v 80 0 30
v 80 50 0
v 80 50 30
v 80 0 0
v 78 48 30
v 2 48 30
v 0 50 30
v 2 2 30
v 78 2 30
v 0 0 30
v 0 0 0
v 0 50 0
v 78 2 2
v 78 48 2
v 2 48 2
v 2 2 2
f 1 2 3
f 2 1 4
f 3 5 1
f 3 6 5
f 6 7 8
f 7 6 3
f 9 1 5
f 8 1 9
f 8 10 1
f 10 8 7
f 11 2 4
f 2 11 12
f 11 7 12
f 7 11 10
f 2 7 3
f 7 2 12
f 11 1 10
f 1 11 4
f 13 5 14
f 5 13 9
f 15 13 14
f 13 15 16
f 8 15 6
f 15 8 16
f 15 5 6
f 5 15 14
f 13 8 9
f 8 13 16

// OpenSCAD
/* [Dimensions] */
outer_x = 80;
outer_y = 50;
outer_z = 30;
wall = 2; // [1:5:0.5]

difference() {
  cube([outer_x, outer_y, outer_z]);
  translate([wall, wall, wall])
    cube([outer_x - 2 * wall, outer_y - 2 * wall, outer_z]);
}
